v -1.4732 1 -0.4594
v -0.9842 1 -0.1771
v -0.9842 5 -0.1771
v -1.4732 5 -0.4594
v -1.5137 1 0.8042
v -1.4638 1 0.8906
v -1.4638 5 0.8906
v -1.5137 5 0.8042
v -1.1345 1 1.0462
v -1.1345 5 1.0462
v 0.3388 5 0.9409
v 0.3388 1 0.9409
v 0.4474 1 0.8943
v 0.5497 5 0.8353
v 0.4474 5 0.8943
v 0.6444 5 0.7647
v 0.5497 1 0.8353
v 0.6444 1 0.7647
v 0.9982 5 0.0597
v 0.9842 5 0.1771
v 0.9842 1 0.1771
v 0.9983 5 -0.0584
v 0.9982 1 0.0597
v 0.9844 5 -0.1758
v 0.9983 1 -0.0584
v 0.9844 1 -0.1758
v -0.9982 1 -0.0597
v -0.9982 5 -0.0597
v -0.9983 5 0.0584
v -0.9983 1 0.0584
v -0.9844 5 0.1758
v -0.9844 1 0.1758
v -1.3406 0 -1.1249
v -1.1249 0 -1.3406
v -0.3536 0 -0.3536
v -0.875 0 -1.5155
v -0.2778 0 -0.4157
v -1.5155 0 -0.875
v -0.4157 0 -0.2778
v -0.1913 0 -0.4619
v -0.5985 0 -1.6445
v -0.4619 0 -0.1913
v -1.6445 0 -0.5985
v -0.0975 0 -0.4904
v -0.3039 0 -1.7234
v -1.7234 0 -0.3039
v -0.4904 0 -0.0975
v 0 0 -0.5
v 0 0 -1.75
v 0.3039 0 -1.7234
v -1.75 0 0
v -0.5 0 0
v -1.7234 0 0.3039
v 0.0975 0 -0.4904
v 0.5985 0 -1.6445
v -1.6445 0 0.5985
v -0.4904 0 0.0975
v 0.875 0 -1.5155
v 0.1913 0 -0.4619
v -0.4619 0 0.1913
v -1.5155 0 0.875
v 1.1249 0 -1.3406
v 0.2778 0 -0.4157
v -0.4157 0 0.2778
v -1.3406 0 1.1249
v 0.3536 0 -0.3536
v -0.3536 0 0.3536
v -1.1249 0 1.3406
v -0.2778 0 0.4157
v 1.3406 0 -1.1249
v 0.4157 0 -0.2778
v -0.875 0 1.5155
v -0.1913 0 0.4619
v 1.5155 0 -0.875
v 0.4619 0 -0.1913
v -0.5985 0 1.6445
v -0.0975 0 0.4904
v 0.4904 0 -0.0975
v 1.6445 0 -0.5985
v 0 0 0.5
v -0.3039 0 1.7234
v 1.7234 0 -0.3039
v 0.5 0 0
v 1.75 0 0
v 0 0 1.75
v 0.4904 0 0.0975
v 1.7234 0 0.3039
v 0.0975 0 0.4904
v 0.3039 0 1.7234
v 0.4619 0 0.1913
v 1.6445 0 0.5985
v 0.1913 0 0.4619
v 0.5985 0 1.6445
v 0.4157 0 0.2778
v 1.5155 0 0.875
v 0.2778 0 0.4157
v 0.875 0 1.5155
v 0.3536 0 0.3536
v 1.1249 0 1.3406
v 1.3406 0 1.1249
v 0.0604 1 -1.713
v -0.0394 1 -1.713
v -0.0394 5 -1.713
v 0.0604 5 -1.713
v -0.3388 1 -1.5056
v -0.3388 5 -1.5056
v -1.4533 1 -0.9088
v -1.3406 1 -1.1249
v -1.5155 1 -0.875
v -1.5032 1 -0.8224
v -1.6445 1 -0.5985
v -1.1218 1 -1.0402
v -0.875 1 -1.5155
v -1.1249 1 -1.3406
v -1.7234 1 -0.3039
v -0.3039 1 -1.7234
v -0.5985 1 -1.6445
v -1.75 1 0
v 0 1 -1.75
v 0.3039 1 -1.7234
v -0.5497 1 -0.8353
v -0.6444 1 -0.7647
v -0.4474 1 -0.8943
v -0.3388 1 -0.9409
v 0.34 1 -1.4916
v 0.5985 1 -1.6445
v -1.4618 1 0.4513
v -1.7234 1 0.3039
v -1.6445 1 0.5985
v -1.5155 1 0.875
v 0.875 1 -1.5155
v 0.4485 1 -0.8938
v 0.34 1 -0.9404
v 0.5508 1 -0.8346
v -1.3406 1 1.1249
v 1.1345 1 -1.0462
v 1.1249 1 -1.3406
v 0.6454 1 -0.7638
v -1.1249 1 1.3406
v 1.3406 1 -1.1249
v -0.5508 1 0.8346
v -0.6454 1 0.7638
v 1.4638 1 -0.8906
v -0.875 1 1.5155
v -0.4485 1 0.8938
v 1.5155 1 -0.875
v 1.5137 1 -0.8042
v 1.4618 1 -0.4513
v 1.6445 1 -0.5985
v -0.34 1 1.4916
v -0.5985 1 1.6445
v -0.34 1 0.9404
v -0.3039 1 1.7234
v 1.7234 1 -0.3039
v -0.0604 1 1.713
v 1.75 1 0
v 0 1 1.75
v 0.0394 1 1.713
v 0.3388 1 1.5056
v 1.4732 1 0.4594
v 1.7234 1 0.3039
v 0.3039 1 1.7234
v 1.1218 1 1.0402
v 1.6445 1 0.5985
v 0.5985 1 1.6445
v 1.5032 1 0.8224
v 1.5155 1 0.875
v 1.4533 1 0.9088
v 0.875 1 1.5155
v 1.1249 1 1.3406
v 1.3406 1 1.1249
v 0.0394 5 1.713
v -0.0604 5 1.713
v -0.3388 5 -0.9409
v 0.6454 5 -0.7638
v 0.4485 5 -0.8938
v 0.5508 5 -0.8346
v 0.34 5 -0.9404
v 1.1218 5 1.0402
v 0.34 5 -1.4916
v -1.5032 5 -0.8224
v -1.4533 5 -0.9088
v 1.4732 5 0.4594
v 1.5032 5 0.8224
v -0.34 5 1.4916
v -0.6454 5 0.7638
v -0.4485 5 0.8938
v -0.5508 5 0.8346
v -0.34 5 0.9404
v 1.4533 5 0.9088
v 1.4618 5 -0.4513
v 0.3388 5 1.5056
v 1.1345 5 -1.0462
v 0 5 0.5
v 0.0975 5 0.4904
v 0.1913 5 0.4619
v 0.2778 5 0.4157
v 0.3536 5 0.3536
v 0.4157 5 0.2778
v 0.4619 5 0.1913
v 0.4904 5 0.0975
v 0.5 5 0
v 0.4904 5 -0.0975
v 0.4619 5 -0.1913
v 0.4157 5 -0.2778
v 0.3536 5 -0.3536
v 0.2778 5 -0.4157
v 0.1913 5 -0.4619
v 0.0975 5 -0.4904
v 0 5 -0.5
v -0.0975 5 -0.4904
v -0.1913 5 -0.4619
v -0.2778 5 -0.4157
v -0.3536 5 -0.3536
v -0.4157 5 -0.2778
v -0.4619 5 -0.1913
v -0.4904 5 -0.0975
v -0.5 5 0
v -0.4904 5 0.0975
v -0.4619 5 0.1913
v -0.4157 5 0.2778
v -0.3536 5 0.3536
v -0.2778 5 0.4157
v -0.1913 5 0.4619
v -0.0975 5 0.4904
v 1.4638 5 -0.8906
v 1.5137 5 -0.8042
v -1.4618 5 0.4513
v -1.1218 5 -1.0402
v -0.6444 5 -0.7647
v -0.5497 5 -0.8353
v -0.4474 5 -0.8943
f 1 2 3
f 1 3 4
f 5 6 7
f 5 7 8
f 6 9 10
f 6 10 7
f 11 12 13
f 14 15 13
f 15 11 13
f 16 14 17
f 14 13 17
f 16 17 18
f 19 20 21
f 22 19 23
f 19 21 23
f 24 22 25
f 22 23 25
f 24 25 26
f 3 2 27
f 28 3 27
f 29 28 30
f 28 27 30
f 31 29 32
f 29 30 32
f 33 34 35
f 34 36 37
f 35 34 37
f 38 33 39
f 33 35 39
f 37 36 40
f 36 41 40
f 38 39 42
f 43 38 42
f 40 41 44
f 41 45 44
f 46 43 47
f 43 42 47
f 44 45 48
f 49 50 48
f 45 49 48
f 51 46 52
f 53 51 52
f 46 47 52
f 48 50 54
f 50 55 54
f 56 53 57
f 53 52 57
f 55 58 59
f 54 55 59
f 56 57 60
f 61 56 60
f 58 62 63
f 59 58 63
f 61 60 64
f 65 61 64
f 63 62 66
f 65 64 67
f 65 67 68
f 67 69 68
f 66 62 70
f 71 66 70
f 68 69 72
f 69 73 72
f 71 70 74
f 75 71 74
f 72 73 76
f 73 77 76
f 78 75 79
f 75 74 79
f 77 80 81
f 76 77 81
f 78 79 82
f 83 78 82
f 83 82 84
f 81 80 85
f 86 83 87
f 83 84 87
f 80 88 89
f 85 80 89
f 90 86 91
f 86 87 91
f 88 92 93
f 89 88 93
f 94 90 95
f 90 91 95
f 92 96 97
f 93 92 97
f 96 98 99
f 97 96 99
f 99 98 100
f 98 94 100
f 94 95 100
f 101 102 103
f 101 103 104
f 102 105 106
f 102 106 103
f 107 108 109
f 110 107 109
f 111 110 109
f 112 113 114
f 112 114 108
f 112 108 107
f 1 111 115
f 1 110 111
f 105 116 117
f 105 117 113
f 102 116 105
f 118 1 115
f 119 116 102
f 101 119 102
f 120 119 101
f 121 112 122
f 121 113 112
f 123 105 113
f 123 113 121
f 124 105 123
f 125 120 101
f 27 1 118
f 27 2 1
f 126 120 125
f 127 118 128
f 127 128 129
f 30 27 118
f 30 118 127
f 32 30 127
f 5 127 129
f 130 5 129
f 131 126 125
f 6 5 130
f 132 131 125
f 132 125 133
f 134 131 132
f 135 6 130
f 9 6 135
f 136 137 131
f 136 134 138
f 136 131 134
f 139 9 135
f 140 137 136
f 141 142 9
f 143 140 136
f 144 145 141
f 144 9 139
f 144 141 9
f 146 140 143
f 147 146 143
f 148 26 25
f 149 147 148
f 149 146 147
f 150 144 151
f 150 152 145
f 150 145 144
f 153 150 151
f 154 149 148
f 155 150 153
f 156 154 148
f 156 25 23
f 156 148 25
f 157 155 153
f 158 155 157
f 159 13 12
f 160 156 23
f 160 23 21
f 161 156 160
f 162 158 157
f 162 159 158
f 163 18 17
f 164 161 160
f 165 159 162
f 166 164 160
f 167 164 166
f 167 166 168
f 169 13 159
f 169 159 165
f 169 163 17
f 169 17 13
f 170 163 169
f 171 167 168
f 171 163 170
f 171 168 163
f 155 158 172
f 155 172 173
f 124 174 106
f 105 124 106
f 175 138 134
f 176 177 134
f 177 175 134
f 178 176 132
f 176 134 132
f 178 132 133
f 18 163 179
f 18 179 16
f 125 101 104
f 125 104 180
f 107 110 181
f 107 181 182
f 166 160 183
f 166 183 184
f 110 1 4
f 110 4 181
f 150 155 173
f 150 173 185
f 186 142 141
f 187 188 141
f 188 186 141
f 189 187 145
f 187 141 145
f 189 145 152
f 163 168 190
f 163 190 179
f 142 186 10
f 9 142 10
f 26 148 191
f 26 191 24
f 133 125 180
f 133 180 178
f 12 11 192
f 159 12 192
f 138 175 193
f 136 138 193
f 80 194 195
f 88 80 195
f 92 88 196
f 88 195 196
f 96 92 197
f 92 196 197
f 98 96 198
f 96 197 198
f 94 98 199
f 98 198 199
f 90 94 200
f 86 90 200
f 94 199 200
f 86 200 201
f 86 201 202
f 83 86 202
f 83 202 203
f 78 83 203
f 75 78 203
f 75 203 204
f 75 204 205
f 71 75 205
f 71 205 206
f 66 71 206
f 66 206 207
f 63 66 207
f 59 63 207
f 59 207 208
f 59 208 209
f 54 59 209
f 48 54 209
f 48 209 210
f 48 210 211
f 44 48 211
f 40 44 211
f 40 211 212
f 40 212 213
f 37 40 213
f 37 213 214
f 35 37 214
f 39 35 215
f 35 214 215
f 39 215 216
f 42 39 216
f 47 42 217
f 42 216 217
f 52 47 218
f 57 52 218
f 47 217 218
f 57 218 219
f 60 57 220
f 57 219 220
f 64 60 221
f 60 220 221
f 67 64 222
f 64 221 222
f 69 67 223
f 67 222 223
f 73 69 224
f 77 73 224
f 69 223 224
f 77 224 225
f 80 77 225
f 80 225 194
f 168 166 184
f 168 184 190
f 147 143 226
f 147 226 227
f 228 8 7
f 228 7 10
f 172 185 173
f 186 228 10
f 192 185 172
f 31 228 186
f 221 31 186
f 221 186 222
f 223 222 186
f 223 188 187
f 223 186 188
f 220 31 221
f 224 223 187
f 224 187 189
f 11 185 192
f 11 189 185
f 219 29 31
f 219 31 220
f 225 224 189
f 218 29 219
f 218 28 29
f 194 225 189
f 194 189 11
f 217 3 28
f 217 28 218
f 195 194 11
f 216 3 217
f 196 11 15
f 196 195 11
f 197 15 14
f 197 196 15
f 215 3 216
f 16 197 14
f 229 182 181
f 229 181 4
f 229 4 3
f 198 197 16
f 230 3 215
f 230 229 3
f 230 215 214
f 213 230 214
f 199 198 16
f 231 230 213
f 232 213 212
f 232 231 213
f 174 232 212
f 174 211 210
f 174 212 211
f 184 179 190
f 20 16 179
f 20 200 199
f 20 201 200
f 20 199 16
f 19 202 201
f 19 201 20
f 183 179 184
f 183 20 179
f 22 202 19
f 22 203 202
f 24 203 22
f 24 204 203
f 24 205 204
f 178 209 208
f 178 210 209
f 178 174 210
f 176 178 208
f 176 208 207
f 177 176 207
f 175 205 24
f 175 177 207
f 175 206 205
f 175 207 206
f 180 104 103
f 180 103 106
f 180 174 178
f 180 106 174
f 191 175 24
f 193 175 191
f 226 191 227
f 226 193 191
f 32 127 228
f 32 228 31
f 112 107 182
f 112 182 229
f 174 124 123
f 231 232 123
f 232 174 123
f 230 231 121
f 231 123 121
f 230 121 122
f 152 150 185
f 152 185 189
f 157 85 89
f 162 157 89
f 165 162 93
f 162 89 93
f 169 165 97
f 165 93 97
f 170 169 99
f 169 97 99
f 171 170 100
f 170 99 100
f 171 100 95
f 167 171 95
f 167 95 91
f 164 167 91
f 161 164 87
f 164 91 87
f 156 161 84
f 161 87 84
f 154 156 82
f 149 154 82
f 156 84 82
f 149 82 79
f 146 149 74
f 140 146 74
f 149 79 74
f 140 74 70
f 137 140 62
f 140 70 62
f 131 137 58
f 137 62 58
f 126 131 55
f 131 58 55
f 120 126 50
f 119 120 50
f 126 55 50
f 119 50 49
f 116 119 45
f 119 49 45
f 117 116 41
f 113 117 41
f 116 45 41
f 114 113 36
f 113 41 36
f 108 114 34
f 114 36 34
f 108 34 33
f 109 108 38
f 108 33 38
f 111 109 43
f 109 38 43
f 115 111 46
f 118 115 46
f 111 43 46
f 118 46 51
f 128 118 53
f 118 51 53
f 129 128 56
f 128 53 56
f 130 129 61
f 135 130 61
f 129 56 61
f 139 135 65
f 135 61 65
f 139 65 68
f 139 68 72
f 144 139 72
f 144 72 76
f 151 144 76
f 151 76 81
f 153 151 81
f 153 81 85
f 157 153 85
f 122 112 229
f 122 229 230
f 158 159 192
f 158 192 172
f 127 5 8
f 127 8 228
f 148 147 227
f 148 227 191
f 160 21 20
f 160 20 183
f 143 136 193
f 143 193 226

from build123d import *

# Parameters (mm, degrees)
SKETCH1_R           = 1.75
BOSS_EXTRUDE1_DEPTH = 1
BOSS_EXTRUDE4_DEPTH = 4
SKETCH2_R           = 1
BOSS_EXTRUDE5_DEPTH = 4
CIRPATTERN1_COUNT   = 6
SKETCH4_R           = 0.5
CUT_EXTRUDE1_DEPTH  = 6.578978401


with BuildPart() as part:
    # Sketch1 → Boss-Extrude1 (new body)
    with BuildSketch(Plane(origin=(0, 0, 0), x_dir=(1, 0, 0), z_dir=(0, 1, 0))):
        with Locations(Location((0, 0, 0), (0, 0, 270))):
            Circle(SKETCH1_R)
    extrude(amount=BOSS_EXTRUDE1_DEPTH)

    # Sketch3 → Boss-Extrude4 (add)
    with BuildSketch(Plane(origin=(0, 1, 0), x_dir=(1, 0, 0), z_dir=(0, 1, 0))):
        Polygon((-0.338769463, 0.925294488), (-0.338769463, 1.505565336), (-0.039378585, 1.713038111), (0.060390246, 1.713038111), (0.34, 1.491585005), (0.34, 0.925294488), align=None)
    boss_extrude4 = extrude(amount=BOSS_EXTRUDE4_DEPTH)

    # Sketch2 → Boss-Extrude5 (add)
    with BuildSketch(Plane(origin=(0, 1, 0), x_dir=(1, 0, 0), z_dir=(0, 1, 0))):
        Circle(SKETCH2_R)
    extrude(amount=BOSS_EXTRUDE5_DEPTH)

    # CirPattern1: Boss-Extrude4 ×6 about axis
    cirpattern1_axis = Axis((0, 0, 0), (0, 1, 0))
    for i in range(1, CIRPATTERN1_COUNT):
        add(boss_extrude4.rotate(cirpattern1_axis, i * 360 / CIRPATTERN1_COUNT))

    # Sketch4 → Cut-Extrude1 (cut, through all)
    with BuildSketch(Plane(origin=(0, 5, 0), x_dir=(1, 0, 0), z_dir=(0, 1, 0))):
        with Locations(Location((0, 0, 0), (0, 0, 270))):
            Circle(SKETCH4_R)
    extrude(amount=-CUT_EXTRUDE1_DEPTH, mode=Mode.SUBTRACT)


solid = part.part
